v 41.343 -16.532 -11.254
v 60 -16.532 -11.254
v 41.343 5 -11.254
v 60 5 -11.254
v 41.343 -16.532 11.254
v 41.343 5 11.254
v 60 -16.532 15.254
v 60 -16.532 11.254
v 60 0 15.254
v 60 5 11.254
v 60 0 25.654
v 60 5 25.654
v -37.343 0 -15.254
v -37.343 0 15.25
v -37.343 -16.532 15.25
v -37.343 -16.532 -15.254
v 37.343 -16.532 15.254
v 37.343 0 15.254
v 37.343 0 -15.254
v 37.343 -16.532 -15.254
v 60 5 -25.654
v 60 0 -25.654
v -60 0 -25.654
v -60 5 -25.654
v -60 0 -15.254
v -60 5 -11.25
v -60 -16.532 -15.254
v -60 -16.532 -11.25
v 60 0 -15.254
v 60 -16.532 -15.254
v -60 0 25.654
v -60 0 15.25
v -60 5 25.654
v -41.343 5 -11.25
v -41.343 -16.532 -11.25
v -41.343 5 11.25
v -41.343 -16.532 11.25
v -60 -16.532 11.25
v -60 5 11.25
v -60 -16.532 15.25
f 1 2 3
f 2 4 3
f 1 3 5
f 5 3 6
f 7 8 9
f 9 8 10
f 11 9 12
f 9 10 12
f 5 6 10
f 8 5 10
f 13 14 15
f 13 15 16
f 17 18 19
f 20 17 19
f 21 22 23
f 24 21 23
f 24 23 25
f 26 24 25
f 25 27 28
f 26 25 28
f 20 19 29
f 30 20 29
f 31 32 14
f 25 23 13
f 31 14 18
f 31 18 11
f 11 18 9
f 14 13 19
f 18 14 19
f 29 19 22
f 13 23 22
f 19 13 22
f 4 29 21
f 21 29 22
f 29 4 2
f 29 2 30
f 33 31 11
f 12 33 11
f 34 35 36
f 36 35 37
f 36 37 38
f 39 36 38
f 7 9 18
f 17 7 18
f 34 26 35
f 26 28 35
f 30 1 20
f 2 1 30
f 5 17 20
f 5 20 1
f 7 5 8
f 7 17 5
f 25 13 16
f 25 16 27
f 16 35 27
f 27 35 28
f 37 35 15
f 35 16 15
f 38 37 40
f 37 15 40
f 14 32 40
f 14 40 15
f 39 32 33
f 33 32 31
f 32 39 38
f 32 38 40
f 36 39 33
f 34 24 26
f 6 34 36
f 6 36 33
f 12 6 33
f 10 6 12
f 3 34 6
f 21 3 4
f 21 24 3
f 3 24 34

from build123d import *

# Parameters (mm, degrees)
BOSS_EXTRUDE1_DEPTH = 5
BOSS_EXTRUDE2_DEPTH = 16.532


with BuildPart() as part:
    # Sketch1 → Boss-Extrude1 (new body)
    with BuildSketch(Plane(origin=(0, 0, 0), x_dir=(1, 0, 0), z_dir=(0, 1, 0))):
        Polygon((-60, 25.6535), (-60, 11.24975), (-41.343, 11.24975), (-41.343, -11.24975), (-60, -11.24975), (-60, -25.6535), (60, -25.6535), (60, -11.2535), (41.343, -11.2535), (41.343, 11.2535), (60, 11.2535), (60, 25.6535), align=None)
    extrude(amount=BOSS_EXTRUDE1_DEPTH)

    # Sketch2 → Boss-Extrude2 (add)
    with BuildSketch(Plane.XZ):
        Polygon((60, 15.2535), (37.343, 15.2535), (37.343, -15.2535), (60, -15.2535), (60, -11.2535), (41.343, -11.2535), (41.343, 11.2535), (60, 11.2535), align=None)
        Polygon((-60, 11.24975), (-60, 15.24975), (-37.343, 15.24975), (-37.343, -15.2535), (-60, -15.2535), (-60, -11.24975), (-41.343, -11.24975), (-41.343, 11.24975), align=None)
    extrude(amount=BOSS_EXTRUDE2_DEPTH)


solid = part.part
